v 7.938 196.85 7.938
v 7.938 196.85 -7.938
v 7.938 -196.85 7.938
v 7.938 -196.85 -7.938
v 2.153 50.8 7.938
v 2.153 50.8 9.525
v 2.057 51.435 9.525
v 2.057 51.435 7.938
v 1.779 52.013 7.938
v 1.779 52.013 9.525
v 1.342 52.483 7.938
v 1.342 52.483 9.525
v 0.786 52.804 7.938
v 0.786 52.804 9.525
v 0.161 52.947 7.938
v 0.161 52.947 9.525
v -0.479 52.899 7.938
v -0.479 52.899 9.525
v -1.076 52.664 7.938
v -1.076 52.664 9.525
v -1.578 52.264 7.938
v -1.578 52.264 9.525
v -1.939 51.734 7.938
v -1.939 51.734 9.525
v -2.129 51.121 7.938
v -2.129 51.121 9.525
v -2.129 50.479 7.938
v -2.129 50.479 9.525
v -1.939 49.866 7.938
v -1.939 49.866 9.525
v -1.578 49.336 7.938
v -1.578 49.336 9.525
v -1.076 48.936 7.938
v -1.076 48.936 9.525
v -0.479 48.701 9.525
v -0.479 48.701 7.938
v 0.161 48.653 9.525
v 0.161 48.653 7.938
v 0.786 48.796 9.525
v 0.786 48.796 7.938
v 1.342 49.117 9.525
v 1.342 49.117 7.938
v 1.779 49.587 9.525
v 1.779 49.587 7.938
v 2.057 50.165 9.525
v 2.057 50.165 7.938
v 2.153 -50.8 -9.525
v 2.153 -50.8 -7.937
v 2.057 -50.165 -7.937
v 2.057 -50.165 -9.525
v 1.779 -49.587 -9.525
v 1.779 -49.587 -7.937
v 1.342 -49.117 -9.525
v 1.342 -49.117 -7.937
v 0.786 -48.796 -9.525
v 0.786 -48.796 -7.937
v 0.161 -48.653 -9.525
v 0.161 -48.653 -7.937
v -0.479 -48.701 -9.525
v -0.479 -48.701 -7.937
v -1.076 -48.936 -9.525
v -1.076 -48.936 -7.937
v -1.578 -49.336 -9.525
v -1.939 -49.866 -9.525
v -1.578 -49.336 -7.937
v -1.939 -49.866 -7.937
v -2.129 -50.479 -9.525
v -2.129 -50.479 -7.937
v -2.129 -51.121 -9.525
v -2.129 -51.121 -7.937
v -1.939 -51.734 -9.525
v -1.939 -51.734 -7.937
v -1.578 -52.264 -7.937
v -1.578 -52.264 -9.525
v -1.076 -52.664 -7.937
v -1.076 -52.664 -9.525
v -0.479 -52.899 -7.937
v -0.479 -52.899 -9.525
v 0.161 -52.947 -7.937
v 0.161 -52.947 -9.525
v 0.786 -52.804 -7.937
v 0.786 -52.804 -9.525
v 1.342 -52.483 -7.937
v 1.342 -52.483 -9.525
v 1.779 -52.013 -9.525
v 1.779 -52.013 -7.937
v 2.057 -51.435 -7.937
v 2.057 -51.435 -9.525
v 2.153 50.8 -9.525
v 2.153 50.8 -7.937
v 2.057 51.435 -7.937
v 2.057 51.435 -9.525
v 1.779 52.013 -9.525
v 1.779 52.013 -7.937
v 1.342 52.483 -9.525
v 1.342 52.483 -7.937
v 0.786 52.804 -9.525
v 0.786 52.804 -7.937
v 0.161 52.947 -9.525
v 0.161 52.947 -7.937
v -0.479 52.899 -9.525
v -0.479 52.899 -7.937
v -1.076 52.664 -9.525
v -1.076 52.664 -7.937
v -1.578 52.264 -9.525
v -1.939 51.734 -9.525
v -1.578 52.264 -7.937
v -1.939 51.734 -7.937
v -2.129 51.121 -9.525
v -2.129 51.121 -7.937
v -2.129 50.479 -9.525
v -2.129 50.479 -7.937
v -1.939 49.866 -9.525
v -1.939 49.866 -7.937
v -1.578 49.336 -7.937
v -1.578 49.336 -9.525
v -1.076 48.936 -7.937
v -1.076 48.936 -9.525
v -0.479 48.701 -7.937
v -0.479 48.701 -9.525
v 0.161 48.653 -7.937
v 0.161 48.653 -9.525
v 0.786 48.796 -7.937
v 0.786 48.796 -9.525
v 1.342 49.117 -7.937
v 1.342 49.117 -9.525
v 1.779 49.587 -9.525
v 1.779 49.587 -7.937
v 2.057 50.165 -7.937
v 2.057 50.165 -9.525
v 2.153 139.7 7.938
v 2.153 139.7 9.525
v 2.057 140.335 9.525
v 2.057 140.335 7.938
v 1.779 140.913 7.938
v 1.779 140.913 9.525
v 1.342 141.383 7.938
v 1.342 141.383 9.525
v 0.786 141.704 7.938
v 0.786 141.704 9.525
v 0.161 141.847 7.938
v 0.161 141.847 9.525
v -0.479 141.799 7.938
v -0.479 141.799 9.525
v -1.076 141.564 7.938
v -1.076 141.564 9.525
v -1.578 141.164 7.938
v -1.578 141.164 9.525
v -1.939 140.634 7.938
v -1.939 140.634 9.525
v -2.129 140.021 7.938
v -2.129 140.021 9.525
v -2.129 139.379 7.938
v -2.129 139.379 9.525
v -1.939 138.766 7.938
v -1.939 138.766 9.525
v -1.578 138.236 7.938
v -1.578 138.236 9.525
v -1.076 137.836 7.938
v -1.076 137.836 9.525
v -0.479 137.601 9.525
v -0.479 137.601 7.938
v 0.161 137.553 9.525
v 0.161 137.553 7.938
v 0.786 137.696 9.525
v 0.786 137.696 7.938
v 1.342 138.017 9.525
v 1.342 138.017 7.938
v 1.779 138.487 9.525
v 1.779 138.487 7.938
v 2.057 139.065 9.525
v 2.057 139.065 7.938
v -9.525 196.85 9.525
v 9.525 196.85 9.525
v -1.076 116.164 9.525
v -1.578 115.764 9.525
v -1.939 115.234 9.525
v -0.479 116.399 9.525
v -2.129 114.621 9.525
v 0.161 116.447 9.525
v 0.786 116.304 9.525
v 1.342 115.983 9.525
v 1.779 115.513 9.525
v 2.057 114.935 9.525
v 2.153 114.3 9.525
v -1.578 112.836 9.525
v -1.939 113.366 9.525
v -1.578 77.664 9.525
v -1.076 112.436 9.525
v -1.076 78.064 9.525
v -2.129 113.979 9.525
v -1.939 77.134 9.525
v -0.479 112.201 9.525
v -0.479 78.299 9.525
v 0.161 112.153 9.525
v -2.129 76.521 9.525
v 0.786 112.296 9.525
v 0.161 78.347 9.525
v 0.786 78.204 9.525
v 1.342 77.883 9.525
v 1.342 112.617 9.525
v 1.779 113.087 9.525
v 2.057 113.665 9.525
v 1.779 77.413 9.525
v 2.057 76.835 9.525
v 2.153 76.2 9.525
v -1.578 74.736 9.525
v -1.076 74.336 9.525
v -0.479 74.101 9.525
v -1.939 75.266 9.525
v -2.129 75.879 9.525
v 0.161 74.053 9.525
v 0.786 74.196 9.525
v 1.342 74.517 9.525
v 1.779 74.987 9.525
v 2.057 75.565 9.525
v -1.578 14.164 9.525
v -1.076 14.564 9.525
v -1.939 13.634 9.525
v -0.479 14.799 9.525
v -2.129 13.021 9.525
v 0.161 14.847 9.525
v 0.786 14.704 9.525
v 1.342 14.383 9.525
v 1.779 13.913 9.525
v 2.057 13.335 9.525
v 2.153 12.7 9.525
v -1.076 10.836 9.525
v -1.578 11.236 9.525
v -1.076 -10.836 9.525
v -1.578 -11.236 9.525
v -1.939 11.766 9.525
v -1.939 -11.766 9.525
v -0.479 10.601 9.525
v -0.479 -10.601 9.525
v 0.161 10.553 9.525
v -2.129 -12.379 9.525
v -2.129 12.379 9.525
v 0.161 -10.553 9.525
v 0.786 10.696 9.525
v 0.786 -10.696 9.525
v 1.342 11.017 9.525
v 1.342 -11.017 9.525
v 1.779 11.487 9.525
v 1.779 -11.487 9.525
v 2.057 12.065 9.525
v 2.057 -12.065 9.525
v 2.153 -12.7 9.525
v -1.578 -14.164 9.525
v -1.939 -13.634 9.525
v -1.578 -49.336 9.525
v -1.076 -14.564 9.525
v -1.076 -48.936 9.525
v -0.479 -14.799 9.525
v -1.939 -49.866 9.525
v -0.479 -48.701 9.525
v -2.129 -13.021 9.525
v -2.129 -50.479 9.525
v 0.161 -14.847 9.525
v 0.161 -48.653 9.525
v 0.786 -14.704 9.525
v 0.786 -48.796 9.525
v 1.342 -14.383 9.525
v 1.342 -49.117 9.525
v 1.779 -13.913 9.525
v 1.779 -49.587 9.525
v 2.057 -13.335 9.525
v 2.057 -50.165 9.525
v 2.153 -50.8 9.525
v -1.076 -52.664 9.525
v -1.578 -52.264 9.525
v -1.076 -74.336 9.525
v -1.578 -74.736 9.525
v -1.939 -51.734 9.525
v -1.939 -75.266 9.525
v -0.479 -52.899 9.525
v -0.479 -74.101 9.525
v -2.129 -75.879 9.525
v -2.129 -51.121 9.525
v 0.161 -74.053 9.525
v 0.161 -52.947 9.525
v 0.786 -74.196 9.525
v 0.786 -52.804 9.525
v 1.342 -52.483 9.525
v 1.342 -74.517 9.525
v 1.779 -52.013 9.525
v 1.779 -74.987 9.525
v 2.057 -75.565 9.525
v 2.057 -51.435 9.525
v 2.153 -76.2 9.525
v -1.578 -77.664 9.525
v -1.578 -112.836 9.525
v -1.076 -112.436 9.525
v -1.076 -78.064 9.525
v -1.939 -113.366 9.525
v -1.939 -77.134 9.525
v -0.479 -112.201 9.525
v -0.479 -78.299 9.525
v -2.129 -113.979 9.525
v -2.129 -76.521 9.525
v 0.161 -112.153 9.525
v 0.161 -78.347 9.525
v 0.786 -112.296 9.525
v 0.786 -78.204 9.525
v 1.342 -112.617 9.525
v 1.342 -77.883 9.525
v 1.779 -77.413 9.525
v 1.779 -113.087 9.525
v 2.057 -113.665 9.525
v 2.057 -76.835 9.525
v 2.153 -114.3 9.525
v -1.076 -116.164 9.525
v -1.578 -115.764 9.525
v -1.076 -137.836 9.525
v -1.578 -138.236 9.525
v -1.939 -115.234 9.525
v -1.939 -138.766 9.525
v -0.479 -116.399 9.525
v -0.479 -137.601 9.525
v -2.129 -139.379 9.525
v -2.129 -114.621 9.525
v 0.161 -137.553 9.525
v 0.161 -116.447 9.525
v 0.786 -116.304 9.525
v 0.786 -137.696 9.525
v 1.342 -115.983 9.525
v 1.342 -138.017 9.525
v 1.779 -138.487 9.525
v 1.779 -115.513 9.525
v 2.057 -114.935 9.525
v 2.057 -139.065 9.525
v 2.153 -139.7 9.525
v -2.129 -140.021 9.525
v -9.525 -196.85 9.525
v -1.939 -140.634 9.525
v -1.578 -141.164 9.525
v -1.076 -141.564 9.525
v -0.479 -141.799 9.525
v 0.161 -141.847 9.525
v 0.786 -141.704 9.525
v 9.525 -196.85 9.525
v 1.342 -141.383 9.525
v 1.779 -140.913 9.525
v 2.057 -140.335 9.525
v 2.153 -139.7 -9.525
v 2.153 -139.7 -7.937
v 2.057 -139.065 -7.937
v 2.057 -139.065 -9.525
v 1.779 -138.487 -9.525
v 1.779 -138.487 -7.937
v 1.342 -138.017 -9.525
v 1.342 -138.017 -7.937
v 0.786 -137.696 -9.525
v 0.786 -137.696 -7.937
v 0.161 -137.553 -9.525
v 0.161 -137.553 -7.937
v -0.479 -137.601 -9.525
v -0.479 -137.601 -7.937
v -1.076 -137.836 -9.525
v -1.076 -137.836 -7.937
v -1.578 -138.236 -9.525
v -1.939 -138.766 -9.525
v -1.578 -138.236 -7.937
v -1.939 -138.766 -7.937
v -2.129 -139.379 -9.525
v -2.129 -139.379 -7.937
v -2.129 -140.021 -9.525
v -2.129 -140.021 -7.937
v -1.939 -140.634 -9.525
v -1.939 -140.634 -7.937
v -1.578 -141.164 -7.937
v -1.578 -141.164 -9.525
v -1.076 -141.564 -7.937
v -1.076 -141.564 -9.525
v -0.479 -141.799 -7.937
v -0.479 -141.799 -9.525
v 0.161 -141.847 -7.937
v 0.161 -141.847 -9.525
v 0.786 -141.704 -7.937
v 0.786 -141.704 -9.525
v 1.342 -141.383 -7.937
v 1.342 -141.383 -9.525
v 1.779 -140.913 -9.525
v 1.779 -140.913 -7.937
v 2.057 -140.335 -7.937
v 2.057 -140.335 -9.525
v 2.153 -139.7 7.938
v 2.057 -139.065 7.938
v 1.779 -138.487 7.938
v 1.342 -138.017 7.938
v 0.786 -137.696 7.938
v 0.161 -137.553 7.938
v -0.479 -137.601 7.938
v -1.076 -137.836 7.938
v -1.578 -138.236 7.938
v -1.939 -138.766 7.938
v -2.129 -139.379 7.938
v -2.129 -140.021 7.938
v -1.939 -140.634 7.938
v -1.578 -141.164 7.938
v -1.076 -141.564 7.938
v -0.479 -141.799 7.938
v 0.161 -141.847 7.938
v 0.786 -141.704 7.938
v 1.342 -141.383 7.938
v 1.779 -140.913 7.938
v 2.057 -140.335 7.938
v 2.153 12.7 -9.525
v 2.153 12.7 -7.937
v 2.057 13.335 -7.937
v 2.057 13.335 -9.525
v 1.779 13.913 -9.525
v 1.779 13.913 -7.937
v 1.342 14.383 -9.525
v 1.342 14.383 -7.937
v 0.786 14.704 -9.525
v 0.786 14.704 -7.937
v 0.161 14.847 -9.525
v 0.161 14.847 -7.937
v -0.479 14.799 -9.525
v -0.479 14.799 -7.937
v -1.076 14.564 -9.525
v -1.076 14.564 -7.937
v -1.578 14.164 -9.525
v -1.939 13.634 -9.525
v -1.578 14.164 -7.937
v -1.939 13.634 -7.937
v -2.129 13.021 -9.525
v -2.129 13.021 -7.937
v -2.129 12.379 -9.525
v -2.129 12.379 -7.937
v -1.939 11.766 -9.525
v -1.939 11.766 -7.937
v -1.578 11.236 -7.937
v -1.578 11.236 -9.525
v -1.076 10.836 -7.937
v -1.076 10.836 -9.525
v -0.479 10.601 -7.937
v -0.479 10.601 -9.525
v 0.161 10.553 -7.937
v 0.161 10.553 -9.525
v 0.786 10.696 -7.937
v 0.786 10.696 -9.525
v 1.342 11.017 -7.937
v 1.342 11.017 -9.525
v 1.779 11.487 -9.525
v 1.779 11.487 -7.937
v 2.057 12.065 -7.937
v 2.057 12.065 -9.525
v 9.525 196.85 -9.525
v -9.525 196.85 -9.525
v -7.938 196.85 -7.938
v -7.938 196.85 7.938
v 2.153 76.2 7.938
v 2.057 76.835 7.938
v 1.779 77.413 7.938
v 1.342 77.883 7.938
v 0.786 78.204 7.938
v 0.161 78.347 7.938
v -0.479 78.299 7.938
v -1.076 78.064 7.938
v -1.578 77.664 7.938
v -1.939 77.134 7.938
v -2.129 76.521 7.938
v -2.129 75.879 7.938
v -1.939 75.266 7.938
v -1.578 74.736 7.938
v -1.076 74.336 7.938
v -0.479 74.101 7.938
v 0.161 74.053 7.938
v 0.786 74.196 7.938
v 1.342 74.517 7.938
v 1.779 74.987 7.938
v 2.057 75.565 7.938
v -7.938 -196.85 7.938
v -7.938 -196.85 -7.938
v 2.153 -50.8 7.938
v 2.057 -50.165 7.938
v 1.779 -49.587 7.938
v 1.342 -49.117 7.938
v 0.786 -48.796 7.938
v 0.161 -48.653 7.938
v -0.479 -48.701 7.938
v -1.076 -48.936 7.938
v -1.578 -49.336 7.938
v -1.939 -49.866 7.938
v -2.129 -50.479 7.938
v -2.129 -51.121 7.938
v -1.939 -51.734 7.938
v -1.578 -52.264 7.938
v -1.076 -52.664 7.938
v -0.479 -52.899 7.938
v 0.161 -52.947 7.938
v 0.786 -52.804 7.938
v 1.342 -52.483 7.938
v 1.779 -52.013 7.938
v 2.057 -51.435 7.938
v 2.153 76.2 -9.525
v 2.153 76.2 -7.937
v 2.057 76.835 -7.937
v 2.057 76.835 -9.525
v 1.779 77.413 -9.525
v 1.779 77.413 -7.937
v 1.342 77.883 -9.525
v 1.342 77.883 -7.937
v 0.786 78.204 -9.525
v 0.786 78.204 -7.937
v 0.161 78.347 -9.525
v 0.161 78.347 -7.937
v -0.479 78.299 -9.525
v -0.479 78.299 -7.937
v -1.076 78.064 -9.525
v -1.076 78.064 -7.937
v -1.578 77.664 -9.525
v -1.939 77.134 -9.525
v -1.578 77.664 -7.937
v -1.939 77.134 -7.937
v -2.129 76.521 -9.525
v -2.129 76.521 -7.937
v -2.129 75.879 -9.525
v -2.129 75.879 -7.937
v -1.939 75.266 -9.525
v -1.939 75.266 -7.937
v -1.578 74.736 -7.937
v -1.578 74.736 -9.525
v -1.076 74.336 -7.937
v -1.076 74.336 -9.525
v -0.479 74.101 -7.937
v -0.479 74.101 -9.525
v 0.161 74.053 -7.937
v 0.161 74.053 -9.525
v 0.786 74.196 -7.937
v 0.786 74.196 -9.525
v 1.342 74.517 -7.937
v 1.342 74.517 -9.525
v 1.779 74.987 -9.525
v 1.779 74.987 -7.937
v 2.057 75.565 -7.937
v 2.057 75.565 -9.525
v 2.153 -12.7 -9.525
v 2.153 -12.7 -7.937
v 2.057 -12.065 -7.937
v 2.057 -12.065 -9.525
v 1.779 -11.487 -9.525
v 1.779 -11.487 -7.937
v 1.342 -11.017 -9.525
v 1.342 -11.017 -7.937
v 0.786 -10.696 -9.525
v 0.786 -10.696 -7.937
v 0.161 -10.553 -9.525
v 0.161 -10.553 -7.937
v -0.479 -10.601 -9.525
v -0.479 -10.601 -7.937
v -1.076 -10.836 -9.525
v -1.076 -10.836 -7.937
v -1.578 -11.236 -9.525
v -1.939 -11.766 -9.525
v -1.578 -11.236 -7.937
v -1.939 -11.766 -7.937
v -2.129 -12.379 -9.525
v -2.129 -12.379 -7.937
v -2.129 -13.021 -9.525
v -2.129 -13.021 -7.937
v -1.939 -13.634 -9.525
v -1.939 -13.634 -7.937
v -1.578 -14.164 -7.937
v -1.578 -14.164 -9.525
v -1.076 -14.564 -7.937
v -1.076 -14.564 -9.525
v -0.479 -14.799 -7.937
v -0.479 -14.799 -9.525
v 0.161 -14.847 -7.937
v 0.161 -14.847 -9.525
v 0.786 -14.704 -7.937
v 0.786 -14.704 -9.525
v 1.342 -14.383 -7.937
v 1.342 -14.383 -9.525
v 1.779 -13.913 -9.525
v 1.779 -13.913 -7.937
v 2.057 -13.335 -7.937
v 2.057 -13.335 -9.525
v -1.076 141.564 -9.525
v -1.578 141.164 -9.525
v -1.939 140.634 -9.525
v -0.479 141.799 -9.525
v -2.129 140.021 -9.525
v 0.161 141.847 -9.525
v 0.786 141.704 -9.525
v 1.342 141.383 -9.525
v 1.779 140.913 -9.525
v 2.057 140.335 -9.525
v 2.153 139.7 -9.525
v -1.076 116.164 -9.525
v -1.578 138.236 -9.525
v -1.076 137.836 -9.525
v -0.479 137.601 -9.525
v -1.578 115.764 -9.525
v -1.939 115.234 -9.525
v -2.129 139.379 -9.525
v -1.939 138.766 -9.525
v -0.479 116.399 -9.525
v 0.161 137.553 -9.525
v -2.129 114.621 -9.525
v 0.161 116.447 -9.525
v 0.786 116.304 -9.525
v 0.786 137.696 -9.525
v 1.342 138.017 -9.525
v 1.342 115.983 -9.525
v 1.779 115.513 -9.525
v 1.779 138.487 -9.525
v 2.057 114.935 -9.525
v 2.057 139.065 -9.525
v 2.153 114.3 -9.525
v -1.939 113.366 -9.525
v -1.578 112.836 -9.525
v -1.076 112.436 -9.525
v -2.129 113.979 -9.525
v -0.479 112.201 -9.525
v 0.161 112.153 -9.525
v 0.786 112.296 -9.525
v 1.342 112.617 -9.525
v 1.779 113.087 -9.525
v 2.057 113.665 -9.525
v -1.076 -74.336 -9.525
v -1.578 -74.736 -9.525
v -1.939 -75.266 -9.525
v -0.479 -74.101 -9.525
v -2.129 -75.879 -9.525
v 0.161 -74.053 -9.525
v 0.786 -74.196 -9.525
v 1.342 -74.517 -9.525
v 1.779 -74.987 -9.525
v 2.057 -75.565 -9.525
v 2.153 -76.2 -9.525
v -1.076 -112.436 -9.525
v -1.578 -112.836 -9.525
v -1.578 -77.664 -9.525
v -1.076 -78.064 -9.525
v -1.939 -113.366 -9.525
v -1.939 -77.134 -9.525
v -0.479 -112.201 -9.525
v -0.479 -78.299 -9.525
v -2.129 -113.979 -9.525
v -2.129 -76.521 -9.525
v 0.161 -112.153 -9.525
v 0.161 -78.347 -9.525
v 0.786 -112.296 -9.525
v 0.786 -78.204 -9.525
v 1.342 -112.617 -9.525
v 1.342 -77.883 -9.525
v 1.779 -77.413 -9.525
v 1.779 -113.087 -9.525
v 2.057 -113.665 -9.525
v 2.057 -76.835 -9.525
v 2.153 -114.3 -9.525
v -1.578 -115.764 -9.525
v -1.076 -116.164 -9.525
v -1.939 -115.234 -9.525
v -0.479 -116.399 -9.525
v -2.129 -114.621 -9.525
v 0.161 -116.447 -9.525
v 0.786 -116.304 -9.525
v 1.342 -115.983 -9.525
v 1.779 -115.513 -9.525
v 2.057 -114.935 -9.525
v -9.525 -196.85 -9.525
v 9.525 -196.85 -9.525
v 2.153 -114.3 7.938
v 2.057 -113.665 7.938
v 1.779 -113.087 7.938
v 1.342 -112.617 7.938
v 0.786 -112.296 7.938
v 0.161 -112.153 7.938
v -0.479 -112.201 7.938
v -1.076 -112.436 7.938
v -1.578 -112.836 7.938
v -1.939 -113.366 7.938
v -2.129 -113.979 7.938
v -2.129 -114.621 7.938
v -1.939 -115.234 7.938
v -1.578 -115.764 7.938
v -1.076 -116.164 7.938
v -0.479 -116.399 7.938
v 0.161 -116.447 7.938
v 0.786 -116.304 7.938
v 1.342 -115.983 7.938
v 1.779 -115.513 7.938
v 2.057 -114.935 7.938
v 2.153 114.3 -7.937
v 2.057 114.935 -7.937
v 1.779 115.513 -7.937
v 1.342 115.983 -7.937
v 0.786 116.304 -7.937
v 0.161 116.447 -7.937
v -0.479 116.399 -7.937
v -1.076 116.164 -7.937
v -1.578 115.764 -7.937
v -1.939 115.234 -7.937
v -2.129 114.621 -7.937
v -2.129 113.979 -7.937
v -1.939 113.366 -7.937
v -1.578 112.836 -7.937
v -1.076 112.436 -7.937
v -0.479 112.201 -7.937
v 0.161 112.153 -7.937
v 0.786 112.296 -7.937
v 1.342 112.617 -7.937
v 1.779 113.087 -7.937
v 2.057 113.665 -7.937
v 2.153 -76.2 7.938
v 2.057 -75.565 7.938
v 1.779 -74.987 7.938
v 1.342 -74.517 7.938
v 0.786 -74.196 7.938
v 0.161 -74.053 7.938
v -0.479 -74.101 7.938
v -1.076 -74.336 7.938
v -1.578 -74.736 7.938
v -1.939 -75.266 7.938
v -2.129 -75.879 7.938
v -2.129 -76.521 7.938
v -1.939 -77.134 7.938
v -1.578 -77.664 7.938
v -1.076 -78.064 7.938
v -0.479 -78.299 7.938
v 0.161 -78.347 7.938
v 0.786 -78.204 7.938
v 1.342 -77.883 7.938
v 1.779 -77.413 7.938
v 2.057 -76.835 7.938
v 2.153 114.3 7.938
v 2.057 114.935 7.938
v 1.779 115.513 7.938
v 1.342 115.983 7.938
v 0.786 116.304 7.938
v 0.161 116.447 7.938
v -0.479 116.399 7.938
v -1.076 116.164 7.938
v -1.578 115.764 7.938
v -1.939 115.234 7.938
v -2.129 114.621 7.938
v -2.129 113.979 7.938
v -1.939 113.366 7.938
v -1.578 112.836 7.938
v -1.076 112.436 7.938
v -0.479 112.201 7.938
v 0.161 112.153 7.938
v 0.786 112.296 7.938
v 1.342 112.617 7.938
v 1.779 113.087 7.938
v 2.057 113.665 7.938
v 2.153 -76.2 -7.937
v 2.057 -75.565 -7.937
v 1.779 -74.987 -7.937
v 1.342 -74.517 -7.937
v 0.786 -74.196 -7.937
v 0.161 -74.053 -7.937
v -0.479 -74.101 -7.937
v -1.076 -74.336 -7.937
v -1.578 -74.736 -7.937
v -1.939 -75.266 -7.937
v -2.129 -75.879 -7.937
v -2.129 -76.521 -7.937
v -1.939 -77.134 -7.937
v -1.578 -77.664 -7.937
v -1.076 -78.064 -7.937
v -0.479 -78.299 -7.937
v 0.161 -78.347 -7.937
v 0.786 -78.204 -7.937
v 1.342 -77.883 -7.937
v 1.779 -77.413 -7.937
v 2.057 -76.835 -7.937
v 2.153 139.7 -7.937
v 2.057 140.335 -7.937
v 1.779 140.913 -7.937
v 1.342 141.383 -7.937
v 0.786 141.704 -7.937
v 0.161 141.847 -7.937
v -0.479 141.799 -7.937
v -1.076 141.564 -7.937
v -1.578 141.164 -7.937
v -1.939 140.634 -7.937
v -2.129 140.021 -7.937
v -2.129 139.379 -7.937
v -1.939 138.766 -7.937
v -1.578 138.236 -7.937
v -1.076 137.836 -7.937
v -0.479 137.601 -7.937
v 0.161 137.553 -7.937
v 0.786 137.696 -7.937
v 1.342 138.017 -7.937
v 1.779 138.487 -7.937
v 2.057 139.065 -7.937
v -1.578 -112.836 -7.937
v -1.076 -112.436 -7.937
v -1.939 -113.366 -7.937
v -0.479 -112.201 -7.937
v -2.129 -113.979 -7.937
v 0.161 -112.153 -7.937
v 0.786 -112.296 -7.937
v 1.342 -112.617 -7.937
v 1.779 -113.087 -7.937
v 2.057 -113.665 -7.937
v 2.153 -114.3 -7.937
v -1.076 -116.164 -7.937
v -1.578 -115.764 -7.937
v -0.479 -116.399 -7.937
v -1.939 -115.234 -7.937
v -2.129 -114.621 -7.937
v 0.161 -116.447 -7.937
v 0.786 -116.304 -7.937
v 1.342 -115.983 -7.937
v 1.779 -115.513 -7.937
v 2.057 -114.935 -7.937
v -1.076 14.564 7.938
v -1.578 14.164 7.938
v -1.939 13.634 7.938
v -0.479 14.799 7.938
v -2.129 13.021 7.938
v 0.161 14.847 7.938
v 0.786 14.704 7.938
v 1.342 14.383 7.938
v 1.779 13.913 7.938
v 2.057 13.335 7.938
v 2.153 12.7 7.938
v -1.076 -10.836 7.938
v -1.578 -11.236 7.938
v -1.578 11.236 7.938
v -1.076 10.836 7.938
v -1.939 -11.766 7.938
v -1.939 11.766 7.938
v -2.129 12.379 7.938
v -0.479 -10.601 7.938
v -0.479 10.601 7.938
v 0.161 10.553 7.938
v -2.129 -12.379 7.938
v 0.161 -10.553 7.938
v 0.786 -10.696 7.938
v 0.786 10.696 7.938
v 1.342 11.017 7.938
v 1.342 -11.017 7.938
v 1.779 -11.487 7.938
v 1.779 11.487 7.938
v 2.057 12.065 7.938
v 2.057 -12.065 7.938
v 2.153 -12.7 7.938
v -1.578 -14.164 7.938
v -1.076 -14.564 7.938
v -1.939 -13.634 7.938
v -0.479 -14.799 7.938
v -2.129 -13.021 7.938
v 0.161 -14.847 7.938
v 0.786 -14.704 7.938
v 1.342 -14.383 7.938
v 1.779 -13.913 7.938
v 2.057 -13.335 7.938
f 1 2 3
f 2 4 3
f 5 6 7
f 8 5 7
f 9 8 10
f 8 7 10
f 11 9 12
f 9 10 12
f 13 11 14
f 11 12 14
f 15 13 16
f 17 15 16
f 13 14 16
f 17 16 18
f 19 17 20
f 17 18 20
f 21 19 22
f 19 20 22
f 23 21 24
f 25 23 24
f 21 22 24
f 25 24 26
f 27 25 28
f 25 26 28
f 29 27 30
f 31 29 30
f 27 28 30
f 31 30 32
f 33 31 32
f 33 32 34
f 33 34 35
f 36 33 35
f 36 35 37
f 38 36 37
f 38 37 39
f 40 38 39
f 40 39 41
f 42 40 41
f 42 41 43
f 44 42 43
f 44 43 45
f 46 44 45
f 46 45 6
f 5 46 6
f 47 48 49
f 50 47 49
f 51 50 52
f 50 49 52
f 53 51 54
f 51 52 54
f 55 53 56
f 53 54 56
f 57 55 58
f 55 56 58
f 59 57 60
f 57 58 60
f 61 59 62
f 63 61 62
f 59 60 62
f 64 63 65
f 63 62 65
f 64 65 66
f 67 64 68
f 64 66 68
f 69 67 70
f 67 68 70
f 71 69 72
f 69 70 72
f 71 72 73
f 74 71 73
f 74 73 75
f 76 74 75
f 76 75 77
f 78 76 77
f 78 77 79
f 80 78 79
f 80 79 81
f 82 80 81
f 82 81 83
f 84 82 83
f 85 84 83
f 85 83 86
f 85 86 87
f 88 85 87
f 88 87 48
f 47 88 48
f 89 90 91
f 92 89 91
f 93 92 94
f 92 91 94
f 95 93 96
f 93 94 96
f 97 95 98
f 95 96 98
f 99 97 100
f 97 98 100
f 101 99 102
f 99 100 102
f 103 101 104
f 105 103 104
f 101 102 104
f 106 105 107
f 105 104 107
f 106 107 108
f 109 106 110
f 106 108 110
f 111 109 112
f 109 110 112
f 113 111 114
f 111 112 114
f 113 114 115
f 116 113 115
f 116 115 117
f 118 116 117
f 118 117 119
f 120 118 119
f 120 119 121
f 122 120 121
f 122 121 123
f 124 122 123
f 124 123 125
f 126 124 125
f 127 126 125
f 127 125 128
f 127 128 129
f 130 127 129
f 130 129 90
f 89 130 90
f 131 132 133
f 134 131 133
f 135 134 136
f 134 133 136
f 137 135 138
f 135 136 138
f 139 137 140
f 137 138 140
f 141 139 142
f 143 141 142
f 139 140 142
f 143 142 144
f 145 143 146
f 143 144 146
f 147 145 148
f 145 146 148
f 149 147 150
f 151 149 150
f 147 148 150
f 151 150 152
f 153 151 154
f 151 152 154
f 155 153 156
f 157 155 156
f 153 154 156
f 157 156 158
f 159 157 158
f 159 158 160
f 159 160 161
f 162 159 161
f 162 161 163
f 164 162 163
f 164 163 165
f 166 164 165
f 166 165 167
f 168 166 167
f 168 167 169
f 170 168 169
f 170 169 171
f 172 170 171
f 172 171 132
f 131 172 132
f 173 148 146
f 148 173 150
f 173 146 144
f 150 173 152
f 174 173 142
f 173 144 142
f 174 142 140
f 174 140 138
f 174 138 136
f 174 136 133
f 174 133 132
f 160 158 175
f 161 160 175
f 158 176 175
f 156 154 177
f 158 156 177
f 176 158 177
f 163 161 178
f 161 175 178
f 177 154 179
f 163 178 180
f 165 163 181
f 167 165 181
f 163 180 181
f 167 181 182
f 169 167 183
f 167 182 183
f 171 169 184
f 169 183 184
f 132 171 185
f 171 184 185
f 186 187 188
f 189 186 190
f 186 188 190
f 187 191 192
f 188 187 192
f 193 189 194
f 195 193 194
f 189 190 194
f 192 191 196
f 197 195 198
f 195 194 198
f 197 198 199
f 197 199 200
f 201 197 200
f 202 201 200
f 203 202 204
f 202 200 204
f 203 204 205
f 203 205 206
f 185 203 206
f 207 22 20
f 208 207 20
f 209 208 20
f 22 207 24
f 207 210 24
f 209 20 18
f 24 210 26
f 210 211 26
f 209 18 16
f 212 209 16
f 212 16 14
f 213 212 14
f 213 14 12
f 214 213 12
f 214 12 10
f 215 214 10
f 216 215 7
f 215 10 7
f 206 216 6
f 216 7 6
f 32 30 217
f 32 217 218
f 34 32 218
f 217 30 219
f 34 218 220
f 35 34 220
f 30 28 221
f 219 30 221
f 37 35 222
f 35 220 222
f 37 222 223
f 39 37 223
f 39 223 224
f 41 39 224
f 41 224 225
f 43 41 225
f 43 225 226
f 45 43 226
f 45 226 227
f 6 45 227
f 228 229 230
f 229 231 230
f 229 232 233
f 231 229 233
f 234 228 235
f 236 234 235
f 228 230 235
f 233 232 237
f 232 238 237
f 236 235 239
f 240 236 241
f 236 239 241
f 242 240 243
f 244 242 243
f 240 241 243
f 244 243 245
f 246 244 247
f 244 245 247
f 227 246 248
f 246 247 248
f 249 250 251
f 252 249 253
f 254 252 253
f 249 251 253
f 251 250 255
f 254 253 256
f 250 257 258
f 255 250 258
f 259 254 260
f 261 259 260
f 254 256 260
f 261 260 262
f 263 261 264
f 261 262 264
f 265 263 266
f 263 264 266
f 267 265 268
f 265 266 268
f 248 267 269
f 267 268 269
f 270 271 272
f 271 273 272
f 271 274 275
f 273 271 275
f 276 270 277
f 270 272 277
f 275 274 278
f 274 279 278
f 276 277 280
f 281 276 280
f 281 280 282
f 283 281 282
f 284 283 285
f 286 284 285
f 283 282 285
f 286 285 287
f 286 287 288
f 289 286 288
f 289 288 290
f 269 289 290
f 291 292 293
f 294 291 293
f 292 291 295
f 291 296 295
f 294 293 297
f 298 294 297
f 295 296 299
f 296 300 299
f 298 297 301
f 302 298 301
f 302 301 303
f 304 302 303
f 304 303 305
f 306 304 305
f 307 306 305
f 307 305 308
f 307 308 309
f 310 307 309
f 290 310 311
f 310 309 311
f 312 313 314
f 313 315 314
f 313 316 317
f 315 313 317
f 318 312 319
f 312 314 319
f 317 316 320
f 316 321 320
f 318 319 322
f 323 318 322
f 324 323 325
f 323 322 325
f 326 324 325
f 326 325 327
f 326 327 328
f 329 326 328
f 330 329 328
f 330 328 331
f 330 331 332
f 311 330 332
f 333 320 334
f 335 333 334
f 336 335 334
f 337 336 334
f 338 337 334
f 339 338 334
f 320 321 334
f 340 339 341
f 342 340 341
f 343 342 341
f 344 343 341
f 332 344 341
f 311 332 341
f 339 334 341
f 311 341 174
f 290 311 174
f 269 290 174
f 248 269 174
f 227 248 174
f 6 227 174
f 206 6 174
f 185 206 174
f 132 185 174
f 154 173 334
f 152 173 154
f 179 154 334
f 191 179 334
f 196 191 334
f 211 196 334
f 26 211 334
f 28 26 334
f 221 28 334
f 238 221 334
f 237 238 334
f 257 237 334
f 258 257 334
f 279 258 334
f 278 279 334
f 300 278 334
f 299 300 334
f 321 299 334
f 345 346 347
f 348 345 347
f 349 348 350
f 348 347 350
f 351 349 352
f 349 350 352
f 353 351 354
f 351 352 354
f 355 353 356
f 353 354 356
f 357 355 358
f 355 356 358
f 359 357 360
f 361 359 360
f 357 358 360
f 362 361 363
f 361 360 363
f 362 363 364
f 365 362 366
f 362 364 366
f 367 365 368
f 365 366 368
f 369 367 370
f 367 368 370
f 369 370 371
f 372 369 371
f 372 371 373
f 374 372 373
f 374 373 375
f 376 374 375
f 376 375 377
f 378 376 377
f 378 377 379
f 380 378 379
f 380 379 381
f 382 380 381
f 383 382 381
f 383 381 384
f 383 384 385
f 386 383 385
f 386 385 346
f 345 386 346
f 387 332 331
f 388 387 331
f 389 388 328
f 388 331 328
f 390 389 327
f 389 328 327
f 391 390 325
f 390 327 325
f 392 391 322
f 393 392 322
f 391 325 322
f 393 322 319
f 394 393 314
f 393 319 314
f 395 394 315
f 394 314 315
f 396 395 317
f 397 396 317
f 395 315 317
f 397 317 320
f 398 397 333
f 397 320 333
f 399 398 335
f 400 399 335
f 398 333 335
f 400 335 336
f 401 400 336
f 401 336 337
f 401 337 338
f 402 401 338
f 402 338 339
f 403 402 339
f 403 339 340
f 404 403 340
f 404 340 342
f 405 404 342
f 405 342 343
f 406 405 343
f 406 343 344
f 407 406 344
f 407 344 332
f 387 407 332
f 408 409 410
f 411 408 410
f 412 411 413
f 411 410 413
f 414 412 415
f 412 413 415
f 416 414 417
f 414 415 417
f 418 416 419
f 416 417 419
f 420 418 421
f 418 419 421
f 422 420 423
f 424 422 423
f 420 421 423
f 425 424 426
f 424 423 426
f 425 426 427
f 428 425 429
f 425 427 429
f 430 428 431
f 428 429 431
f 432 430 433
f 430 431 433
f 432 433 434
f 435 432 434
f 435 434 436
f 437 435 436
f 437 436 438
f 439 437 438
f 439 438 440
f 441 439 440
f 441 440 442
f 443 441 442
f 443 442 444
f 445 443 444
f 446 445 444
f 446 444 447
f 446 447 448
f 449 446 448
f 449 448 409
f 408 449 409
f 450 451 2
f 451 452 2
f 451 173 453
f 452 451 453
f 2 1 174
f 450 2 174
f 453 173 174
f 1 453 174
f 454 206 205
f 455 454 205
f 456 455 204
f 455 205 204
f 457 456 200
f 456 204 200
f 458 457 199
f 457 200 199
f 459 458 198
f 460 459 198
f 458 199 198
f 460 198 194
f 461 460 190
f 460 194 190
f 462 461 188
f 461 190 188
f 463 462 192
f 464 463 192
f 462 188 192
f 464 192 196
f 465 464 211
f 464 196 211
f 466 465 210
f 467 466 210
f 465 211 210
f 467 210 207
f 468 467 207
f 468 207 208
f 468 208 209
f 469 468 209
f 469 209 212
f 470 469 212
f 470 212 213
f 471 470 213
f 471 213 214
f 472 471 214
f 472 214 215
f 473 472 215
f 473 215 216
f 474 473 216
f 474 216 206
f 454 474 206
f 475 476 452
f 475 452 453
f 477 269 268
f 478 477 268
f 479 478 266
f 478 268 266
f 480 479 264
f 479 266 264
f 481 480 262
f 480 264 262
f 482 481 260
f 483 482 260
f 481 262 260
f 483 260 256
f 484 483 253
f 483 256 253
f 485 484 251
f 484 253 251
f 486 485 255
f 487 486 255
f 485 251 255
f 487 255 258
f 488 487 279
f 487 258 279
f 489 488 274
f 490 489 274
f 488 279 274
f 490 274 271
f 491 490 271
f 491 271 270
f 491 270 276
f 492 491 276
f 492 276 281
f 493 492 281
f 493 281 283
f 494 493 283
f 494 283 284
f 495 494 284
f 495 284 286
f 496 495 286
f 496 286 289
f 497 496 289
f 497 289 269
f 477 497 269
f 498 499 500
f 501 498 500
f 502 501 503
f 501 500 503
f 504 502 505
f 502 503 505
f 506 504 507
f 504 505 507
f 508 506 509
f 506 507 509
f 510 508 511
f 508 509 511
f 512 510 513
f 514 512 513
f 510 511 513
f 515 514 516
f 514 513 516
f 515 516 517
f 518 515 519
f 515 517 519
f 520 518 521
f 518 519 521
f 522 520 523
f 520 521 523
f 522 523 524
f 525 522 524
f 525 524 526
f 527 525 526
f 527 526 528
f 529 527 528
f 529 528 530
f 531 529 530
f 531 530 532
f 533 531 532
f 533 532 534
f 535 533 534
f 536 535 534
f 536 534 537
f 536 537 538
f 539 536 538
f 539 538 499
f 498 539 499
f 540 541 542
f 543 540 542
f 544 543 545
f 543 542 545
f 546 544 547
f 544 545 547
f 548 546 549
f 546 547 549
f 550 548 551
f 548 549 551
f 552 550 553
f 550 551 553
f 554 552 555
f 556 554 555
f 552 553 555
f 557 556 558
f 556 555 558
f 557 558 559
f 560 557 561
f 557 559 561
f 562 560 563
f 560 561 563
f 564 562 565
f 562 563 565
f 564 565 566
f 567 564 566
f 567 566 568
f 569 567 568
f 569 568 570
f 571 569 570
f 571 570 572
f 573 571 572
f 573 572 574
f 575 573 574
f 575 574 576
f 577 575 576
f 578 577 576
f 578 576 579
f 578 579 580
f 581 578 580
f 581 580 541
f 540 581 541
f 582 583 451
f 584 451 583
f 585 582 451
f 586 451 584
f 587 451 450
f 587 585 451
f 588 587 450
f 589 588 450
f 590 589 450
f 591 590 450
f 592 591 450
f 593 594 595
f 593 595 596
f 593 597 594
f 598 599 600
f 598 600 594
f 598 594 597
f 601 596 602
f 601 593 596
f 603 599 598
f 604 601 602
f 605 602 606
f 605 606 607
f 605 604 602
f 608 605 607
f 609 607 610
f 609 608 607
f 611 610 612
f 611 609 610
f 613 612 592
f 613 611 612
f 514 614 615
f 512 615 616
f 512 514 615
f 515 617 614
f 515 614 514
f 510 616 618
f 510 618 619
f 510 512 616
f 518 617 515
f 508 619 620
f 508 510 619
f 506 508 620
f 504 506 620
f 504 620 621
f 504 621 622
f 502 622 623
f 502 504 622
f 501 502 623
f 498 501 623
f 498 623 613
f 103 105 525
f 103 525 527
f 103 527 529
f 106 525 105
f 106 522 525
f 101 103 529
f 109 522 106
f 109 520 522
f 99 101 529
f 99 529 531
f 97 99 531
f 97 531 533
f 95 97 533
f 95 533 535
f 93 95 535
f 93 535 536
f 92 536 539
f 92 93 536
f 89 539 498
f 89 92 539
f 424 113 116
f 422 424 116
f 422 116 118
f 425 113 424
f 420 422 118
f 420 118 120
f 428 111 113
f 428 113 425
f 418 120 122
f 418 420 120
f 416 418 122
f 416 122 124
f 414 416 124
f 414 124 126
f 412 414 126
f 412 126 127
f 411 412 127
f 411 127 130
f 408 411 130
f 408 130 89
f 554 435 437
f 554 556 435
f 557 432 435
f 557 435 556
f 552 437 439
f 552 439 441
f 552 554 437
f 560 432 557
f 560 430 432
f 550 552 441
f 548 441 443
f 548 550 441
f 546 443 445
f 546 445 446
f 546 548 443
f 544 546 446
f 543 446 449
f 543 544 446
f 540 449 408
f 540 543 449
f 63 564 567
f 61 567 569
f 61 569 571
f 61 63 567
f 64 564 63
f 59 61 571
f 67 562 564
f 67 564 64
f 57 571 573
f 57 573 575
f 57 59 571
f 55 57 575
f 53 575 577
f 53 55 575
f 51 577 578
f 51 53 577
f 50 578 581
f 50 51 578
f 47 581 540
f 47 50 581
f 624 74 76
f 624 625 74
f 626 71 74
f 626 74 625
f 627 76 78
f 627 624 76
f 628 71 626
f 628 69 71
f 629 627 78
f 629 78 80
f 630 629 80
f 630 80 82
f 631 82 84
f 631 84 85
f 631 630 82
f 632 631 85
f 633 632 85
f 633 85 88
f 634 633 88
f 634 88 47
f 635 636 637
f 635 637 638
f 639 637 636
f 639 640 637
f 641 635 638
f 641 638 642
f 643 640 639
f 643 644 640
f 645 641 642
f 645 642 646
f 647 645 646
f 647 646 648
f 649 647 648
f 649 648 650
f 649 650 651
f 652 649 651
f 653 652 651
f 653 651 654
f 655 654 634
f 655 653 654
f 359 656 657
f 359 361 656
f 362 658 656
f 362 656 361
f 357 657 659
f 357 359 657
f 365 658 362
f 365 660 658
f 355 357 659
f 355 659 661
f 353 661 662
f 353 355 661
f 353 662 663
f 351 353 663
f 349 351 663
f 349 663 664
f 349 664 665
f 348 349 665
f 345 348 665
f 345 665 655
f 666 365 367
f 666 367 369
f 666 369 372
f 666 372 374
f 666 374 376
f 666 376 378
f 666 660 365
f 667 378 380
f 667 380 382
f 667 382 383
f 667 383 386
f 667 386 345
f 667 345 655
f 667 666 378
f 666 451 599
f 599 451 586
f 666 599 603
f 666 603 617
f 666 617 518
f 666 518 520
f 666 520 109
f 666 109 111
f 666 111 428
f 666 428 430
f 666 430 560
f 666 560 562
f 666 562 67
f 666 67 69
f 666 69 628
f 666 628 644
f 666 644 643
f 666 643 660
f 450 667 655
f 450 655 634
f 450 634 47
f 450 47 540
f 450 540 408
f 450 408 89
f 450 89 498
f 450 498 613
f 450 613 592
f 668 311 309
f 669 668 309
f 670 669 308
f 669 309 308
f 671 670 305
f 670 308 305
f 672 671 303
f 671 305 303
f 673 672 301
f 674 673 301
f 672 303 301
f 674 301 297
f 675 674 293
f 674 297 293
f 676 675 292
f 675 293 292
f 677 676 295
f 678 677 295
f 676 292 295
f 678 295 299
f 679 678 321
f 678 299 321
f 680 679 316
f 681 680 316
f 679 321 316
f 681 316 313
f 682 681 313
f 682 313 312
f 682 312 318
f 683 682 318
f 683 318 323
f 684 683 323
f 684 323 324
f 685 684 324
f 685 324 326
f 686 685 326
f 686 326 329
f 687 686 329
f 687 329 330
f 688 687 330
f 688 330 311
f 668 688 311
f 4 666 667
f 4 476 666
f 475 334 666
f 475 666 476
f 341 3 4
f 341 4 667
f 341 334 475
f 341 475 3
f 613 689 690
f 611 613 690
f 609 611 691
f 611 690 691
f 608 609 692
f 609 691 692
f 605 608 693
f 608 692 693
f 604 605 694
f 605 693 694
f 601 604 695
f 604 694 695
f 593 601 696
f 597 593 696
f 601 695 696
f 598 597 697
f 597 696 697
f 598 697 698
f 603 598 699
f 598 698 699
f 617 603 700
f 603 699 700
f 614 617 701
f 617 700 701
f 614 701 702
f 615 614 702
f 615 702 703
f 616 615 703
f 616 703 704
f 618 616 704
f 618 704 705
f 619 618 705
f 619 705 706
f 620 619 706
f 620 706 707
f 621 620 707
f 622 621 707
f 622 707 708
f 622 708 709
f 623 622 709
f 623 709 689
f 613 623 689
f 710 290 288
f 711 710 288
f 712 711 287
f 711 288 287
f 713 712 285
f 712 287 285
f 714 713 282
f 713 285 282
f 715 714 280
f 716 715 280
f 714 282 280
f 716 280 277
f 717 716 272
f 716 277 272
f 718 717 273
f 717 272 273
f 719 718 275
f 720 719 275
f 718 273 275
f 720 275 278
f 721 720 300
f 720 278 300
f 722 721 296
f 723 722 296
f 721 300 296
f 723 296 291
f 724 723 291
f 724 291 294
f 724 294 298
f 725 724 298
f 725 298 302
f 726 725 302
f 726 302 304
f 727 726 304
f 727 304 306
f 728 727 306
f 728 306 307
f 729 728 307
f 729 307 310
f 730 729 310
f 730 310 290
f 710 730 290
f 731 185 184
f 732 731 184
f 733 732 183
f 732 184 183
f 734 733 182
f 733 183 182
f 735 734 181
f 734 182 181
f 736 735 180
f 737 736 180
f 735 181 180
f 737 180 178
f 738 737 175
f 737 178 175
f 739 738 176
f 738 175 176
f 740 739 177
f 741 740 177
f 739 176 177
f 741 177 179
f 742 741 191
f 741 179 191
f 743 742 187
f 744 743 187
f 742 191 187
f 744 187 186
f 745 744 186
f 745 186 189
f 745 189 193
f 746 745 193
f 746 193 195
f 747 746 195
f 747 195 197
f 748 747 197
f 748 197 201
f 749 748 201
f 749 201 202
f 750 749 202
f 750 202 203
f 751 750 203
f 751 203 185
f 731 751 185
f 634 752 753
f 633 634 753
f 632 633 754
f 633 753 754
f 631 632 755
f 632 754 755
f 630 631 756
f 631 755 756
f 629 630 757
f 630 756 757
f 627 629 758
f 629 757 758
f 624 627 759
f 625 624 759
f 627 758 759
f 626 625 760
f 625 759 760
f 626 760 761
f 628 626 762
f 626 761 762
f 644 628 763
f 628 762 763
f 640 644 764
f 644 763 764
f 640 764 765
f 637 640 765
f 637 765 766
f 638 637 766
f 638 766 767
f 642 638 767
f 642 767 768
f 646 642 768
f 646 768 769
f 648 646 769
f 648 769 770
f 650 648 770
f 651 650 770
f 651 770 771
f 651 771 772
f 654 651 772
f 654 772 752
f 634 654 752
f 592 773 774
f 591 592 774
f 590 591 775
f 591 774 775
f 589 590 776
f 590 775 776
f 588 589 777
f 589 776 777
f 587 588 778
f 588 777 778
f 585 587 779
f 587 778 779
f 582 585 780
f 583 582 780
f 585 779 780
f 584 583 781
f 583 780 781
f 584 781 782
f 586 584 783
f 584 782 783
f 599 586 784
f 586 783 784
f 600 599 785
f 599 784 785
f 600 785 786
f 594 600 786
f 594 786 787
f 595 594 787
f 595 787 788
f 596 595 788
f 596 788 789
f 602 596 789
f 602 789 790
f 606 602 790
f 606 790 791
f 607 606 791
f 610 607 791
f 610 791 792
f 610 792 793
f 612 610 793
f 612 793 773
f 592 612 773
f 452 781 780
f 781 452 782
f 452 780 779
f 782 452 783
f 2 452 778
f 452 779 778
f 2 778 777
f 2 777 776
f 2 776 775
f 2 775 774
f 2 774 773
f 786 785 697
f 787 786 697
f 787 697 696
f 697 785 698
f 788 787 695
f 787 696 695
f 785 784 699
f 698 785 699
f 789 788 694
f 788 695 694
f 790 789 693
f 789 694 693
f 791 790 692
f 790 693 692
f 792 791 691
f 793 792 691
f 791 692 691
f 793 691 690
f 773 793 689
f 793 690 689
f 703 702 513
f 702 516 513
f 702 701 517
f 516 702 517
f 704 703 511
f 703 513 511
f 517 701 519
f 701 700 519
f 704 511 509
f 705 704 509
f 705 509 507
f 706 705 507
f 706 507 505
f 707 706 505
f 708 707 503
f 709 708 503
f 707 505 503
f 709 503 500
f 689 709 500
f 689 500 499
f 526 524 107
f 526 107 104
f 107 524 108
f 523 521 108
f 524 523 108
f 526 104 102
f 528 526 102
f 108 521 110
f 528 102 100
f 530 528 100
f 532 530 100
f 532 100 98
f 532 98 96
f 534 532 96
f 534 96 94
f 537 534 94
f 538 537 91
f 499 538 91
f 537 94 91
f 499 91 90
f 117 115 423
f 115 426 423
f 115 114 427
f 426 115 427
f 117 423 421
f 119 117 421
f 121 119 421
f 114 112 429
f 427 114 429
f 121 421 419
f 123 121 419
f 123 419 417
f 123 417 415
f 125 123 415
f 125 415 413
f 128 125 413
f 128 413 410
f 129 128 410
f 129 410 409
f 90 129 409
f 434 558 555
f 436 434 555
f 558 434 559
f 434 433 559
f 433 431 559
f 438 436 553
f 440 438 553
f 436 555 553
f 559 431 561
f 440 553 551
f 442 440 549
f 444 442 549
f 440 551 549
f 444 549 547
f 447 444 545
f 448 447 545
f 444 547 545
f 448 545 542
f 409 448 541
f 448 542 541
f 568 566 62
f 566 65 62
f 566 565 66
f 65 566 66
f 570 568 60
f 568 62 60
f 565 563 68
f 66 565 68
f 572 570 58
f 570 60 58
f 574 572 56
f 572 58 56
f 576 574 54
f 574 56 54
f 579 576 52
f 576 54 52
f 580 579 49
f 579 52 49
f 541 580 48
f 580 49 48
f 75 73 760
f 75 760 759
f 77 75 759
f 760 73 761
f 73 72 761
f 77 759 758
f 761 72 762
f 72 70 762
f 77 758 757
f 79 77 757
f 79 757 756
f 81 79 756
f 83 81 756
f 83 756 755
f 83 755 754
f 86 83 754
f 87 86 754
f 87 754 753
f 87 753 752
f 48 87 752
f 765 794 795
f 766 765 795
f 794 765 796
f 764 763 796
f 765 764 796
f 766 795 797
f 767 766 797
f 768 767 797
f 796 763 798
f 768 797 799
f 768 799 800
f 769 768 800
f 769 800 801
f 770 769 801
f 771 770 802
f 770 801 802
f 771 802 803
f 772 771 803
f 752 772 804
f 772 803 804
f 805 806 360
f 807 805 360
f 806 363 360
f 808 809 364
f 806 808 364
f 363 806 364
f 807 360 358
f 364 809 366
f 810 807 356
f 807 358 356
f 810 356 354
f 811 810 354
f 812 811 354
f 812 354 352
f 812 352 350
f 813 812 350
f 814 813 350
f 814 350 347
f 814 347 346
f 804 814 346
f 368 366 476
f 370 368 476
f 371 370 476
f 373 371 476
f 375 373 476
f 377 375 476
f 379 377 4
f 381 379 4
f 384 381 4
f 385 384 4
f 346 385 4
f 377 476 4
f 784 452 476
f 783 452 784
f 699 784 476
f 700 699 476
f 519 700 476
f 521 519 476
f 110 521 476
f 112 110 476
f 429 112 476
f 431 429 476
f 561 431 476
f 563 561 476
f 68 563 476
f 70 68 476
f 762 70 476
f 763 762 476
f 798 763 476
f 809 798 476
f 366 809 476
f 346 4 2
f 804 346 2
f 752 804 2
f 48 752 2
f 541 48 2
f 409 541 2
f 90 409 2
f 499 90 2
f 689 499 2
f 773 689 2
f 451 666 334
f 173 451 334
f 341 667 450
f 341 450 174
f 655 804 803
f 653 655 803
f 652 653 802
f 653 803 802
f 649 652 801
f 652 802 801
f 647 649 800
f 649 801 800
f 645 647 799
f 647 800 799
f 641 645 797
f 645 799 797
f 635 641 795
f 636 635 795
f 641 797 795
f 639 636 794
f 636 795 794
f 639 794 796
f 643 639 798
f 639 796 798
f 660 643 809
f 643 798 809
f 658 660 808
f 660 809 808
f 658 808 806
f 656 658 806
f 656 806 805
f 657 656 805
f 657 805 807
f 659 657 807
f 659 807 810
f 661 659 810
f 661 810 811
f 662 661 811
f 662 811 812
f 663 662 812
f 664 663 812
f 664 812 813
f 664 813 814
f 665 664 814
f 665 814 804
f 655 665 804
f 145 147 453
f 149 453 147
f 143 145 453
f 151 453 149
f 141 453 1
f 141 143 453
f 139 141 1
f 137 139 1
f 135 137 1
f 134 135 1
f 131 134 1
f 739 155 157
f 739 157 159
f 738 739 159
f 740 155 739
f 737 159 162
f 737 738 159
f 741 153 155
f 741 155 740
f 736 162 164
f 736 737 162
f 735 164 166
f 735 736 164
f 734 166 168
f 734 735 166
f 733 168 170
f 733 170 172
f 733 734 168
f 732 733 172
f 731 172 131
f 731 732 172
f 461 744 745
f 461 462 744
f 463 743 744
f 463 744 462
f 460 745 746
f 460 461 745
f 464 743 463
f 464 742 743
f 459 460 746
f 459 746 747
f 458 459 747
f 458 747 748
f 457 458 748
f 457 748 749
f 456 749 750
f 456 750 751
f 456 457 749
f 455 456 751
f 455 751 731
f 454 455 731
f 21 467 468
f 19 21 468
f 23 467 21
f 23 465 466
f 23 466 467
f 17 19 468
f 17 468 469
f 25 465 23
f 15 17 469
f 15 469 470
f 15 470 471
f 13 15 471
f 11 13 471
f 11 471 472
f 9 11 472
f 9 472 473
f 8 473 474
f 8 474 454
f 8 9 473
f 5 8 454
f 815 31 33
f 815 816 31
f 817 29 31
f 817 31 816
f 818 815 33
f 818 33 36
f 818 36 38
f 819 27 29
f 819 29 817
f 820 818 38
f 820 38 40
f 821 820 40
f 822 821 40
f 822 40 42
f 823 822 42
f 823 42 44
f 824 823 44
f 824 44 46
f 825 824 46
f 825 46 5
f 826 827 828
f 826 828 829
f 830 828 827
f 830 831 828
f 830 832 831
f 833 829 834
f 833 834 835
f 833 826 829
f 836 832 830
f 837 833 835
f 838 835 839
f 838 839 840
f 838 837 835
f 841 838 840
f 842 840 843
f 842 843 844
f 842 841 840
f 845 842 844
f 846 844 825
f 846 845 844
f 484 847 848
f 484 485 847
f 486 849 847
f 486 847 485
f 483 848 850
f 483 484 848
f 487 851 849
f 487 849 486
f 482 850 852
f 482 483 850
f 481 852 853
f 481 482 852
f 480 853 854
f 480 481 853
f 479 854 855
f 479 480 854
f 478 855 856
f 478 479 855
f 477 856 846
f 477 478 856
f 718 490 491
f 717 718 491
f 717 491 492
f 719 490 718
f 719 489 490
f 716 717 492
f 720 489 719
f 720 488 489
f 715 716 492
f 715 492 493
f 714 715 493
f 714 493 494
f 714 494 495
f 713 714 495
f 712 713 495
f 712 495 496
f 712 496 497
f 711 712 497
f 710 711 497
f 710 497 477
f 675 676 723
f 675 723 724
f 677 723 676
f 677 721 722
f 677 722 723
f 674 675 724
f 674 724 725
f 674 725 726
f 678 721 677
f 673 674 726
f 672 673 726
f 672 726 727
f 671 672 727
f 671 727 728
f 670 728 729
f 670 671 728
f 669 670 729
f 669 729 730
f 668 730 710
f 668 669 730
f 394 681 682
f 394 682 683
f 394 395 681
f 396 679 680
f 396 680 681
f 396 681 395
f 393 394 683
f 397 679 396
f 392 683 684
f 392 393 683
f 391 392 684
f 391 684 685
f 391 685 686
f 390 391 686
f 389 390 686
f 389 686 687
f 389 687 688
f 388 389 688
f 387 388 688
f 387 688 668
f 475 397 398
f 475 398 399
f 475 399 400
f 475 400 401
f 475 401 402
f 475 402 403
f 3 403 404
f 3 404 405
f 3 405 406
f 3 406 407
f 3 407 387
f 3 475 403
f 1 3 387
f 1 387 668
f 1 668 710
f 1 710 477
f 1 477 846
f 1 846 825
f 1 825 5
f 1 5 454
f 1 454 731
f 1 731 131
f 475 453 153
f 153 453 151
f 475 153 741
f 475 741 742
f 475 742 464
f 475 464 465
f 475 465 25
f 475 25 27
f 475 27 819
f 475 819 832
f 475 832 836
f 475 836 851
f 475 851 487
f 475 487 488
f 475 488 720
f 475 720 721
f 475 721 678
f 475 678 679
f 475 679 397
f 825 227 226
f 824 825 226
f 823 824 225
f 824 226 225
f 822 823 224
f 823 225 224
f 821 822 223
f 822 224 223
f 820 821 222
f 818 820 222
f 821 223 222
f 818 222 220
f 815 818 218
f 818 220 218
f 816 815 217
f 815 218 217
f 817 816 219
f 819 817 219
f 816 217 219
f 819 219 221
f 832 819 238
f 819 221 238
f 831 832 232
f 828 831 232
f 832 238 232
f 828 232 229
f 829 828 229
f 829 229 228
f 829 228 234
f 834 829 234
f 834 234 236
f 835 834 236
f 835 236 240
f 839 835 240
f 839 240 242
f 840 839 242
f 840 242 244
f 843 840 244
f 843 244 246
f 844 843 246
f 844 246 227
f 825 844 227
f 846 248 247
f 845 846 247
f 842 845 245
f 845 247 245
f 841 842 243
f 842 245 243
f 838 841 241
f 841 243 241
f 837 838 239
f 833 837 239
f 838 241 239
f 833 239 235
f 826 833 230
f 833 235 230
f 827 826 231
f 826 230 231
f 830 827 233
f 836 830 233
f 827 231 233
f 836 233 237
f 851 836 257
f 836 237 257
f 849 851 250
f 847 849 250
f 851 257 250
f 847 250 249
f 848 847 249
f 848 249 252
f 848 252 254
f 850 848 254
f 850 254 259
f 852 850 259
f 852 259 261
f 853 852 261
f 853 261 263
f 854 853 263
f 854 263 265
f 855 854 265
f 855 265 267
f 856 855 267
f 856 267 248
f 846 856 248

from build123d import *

# Parameters (mm, degrees)
F0_W       = 19.05
F0_H       = 19.05
F0_W_2     = 15.875
F0_H_2     = 15.875
F1_DEPTH   = 196.85
F2_R       = 2.15265
F1_FACE1_W = 19.05
F1_FACE1_H = 393.7
F3_DEPTH   = 25.4


with BuildPart() as f1:
    # F0 (on Front) → F1 (new body, symmetric)
    with BuildSketch(Plane.XZ):
        Rectangle(F0_W, F0_H)
        Rectangle(F0_W_2, F0_H_2, mode=Mode.SUBTRACT)
    extrude(amount=F1_DEPTH, both=True)

    # F2 (on face) + F1_face1 (on face) → F3 (cut)
    with BuildSketch(Plane.XY.offset(9.525)):
        with Locations((0, 12.7)):
            Circle(F2_R)
        with Locations((0, -12.7)):
            Circle(F2_R)
        with Locations((0, 76.2)):
            Circle(F2_R)
        with Locations((0, 50.8)):
            Circle(F2_R)
        with Locations((0, 139.7)):
            Circle(F2_R)
        with Locations((0, 114.3)):
            Circle(F2_R)
        with Locations((0, -50.8)):
            Circle(F2_R)
        with Locations((0, -76.2)):
            Circle(F2_R)
        with Locations((0, -114.3)):
            Circle(F2_R)
        with Locations((0, -139.7)):
            Circle(F2_R)
    with BuildSketch(Plane(origin=(0, 0, -9.525), x_dir=(1, 0, 0), z_dir=(0, 0, -1))):
        Rectangle(F1_FACE1_W, F1_FACE1_H)
    extrude(amount=-F3_DEPTH, dir=(0, 0, 1), mode=Mode.SUBTRACT)


solid = f1.part
